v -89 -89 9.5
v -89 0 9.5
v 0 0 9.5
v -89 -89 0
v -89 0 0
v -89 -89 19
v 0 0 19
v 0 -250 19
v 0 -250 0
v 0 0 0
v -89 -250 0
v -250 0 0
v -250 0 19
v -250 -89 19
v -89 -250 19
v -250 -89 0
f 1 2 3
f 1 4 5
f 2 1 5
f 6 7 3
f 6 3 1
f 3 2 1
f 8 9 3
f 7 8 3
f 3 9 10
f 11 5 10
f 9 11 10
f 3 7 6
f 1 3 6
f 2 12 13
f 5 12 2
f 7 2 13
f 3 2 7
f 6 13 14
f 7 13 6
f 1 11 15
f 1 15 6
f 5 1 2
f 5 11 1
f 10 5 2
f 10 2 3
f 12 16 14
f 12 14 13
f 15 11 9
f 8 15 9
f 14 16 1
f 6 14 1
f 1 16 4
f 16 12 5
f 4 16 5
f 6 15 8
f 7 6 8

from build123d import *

# Parameters (mm, degrees)
F0_W     = 250
F0_H     = 89
F1_DEPTH = 19
F2_W     = 89
F2_H     = 250
F3_DEPTH = 19
F5_DEPTH = 19.001
F7_DEPTH = 9.5


with BuildPart() as f1:
    # F0 (on Top) → F1 (new body)
    with BuildSketch(Plane.XY):
        with Locations((-125, -44.5)):
            Rectangle(F0_W, F0_H)
    extrude(amount=F1_DEPTH)

    # F4 (on face) → F5 (cut, through all)
    with BuildSketch(Plane.XY.offset(19)):
        Polygon((0, -89), (0, 0), (-89, -89), align=None)
    extrude(amount=-F5_DEPTH, mode=Mode.SUBTRACT)

    # F6 (on face) → F7 (cut)
    with BuildSketch(Plane(origin=(0, 0, 0), x_dir=(1, 0, 0), z_dir=(0, 0, -1))):
        Polygon((0, 0), (-89, 89), (-89, 0), align=None)
    extrude(amount=-F7_DEPTH, mode=Mode.SUBTRACT)


with BuildPart() as f3:
    # F2 (on Top) → F3 (new body)
    with BuildSketch(Plane.XY):
        with Locations((-44.5, -125)):
            Rectangle(F2_W, F2_H)
    extrude(amount=F3_DEPTH)

    # F8: cut F1
    add(f1.part, mode=Mode.SUBTRACT)


solid = Compound([f1.part, f3.part])
